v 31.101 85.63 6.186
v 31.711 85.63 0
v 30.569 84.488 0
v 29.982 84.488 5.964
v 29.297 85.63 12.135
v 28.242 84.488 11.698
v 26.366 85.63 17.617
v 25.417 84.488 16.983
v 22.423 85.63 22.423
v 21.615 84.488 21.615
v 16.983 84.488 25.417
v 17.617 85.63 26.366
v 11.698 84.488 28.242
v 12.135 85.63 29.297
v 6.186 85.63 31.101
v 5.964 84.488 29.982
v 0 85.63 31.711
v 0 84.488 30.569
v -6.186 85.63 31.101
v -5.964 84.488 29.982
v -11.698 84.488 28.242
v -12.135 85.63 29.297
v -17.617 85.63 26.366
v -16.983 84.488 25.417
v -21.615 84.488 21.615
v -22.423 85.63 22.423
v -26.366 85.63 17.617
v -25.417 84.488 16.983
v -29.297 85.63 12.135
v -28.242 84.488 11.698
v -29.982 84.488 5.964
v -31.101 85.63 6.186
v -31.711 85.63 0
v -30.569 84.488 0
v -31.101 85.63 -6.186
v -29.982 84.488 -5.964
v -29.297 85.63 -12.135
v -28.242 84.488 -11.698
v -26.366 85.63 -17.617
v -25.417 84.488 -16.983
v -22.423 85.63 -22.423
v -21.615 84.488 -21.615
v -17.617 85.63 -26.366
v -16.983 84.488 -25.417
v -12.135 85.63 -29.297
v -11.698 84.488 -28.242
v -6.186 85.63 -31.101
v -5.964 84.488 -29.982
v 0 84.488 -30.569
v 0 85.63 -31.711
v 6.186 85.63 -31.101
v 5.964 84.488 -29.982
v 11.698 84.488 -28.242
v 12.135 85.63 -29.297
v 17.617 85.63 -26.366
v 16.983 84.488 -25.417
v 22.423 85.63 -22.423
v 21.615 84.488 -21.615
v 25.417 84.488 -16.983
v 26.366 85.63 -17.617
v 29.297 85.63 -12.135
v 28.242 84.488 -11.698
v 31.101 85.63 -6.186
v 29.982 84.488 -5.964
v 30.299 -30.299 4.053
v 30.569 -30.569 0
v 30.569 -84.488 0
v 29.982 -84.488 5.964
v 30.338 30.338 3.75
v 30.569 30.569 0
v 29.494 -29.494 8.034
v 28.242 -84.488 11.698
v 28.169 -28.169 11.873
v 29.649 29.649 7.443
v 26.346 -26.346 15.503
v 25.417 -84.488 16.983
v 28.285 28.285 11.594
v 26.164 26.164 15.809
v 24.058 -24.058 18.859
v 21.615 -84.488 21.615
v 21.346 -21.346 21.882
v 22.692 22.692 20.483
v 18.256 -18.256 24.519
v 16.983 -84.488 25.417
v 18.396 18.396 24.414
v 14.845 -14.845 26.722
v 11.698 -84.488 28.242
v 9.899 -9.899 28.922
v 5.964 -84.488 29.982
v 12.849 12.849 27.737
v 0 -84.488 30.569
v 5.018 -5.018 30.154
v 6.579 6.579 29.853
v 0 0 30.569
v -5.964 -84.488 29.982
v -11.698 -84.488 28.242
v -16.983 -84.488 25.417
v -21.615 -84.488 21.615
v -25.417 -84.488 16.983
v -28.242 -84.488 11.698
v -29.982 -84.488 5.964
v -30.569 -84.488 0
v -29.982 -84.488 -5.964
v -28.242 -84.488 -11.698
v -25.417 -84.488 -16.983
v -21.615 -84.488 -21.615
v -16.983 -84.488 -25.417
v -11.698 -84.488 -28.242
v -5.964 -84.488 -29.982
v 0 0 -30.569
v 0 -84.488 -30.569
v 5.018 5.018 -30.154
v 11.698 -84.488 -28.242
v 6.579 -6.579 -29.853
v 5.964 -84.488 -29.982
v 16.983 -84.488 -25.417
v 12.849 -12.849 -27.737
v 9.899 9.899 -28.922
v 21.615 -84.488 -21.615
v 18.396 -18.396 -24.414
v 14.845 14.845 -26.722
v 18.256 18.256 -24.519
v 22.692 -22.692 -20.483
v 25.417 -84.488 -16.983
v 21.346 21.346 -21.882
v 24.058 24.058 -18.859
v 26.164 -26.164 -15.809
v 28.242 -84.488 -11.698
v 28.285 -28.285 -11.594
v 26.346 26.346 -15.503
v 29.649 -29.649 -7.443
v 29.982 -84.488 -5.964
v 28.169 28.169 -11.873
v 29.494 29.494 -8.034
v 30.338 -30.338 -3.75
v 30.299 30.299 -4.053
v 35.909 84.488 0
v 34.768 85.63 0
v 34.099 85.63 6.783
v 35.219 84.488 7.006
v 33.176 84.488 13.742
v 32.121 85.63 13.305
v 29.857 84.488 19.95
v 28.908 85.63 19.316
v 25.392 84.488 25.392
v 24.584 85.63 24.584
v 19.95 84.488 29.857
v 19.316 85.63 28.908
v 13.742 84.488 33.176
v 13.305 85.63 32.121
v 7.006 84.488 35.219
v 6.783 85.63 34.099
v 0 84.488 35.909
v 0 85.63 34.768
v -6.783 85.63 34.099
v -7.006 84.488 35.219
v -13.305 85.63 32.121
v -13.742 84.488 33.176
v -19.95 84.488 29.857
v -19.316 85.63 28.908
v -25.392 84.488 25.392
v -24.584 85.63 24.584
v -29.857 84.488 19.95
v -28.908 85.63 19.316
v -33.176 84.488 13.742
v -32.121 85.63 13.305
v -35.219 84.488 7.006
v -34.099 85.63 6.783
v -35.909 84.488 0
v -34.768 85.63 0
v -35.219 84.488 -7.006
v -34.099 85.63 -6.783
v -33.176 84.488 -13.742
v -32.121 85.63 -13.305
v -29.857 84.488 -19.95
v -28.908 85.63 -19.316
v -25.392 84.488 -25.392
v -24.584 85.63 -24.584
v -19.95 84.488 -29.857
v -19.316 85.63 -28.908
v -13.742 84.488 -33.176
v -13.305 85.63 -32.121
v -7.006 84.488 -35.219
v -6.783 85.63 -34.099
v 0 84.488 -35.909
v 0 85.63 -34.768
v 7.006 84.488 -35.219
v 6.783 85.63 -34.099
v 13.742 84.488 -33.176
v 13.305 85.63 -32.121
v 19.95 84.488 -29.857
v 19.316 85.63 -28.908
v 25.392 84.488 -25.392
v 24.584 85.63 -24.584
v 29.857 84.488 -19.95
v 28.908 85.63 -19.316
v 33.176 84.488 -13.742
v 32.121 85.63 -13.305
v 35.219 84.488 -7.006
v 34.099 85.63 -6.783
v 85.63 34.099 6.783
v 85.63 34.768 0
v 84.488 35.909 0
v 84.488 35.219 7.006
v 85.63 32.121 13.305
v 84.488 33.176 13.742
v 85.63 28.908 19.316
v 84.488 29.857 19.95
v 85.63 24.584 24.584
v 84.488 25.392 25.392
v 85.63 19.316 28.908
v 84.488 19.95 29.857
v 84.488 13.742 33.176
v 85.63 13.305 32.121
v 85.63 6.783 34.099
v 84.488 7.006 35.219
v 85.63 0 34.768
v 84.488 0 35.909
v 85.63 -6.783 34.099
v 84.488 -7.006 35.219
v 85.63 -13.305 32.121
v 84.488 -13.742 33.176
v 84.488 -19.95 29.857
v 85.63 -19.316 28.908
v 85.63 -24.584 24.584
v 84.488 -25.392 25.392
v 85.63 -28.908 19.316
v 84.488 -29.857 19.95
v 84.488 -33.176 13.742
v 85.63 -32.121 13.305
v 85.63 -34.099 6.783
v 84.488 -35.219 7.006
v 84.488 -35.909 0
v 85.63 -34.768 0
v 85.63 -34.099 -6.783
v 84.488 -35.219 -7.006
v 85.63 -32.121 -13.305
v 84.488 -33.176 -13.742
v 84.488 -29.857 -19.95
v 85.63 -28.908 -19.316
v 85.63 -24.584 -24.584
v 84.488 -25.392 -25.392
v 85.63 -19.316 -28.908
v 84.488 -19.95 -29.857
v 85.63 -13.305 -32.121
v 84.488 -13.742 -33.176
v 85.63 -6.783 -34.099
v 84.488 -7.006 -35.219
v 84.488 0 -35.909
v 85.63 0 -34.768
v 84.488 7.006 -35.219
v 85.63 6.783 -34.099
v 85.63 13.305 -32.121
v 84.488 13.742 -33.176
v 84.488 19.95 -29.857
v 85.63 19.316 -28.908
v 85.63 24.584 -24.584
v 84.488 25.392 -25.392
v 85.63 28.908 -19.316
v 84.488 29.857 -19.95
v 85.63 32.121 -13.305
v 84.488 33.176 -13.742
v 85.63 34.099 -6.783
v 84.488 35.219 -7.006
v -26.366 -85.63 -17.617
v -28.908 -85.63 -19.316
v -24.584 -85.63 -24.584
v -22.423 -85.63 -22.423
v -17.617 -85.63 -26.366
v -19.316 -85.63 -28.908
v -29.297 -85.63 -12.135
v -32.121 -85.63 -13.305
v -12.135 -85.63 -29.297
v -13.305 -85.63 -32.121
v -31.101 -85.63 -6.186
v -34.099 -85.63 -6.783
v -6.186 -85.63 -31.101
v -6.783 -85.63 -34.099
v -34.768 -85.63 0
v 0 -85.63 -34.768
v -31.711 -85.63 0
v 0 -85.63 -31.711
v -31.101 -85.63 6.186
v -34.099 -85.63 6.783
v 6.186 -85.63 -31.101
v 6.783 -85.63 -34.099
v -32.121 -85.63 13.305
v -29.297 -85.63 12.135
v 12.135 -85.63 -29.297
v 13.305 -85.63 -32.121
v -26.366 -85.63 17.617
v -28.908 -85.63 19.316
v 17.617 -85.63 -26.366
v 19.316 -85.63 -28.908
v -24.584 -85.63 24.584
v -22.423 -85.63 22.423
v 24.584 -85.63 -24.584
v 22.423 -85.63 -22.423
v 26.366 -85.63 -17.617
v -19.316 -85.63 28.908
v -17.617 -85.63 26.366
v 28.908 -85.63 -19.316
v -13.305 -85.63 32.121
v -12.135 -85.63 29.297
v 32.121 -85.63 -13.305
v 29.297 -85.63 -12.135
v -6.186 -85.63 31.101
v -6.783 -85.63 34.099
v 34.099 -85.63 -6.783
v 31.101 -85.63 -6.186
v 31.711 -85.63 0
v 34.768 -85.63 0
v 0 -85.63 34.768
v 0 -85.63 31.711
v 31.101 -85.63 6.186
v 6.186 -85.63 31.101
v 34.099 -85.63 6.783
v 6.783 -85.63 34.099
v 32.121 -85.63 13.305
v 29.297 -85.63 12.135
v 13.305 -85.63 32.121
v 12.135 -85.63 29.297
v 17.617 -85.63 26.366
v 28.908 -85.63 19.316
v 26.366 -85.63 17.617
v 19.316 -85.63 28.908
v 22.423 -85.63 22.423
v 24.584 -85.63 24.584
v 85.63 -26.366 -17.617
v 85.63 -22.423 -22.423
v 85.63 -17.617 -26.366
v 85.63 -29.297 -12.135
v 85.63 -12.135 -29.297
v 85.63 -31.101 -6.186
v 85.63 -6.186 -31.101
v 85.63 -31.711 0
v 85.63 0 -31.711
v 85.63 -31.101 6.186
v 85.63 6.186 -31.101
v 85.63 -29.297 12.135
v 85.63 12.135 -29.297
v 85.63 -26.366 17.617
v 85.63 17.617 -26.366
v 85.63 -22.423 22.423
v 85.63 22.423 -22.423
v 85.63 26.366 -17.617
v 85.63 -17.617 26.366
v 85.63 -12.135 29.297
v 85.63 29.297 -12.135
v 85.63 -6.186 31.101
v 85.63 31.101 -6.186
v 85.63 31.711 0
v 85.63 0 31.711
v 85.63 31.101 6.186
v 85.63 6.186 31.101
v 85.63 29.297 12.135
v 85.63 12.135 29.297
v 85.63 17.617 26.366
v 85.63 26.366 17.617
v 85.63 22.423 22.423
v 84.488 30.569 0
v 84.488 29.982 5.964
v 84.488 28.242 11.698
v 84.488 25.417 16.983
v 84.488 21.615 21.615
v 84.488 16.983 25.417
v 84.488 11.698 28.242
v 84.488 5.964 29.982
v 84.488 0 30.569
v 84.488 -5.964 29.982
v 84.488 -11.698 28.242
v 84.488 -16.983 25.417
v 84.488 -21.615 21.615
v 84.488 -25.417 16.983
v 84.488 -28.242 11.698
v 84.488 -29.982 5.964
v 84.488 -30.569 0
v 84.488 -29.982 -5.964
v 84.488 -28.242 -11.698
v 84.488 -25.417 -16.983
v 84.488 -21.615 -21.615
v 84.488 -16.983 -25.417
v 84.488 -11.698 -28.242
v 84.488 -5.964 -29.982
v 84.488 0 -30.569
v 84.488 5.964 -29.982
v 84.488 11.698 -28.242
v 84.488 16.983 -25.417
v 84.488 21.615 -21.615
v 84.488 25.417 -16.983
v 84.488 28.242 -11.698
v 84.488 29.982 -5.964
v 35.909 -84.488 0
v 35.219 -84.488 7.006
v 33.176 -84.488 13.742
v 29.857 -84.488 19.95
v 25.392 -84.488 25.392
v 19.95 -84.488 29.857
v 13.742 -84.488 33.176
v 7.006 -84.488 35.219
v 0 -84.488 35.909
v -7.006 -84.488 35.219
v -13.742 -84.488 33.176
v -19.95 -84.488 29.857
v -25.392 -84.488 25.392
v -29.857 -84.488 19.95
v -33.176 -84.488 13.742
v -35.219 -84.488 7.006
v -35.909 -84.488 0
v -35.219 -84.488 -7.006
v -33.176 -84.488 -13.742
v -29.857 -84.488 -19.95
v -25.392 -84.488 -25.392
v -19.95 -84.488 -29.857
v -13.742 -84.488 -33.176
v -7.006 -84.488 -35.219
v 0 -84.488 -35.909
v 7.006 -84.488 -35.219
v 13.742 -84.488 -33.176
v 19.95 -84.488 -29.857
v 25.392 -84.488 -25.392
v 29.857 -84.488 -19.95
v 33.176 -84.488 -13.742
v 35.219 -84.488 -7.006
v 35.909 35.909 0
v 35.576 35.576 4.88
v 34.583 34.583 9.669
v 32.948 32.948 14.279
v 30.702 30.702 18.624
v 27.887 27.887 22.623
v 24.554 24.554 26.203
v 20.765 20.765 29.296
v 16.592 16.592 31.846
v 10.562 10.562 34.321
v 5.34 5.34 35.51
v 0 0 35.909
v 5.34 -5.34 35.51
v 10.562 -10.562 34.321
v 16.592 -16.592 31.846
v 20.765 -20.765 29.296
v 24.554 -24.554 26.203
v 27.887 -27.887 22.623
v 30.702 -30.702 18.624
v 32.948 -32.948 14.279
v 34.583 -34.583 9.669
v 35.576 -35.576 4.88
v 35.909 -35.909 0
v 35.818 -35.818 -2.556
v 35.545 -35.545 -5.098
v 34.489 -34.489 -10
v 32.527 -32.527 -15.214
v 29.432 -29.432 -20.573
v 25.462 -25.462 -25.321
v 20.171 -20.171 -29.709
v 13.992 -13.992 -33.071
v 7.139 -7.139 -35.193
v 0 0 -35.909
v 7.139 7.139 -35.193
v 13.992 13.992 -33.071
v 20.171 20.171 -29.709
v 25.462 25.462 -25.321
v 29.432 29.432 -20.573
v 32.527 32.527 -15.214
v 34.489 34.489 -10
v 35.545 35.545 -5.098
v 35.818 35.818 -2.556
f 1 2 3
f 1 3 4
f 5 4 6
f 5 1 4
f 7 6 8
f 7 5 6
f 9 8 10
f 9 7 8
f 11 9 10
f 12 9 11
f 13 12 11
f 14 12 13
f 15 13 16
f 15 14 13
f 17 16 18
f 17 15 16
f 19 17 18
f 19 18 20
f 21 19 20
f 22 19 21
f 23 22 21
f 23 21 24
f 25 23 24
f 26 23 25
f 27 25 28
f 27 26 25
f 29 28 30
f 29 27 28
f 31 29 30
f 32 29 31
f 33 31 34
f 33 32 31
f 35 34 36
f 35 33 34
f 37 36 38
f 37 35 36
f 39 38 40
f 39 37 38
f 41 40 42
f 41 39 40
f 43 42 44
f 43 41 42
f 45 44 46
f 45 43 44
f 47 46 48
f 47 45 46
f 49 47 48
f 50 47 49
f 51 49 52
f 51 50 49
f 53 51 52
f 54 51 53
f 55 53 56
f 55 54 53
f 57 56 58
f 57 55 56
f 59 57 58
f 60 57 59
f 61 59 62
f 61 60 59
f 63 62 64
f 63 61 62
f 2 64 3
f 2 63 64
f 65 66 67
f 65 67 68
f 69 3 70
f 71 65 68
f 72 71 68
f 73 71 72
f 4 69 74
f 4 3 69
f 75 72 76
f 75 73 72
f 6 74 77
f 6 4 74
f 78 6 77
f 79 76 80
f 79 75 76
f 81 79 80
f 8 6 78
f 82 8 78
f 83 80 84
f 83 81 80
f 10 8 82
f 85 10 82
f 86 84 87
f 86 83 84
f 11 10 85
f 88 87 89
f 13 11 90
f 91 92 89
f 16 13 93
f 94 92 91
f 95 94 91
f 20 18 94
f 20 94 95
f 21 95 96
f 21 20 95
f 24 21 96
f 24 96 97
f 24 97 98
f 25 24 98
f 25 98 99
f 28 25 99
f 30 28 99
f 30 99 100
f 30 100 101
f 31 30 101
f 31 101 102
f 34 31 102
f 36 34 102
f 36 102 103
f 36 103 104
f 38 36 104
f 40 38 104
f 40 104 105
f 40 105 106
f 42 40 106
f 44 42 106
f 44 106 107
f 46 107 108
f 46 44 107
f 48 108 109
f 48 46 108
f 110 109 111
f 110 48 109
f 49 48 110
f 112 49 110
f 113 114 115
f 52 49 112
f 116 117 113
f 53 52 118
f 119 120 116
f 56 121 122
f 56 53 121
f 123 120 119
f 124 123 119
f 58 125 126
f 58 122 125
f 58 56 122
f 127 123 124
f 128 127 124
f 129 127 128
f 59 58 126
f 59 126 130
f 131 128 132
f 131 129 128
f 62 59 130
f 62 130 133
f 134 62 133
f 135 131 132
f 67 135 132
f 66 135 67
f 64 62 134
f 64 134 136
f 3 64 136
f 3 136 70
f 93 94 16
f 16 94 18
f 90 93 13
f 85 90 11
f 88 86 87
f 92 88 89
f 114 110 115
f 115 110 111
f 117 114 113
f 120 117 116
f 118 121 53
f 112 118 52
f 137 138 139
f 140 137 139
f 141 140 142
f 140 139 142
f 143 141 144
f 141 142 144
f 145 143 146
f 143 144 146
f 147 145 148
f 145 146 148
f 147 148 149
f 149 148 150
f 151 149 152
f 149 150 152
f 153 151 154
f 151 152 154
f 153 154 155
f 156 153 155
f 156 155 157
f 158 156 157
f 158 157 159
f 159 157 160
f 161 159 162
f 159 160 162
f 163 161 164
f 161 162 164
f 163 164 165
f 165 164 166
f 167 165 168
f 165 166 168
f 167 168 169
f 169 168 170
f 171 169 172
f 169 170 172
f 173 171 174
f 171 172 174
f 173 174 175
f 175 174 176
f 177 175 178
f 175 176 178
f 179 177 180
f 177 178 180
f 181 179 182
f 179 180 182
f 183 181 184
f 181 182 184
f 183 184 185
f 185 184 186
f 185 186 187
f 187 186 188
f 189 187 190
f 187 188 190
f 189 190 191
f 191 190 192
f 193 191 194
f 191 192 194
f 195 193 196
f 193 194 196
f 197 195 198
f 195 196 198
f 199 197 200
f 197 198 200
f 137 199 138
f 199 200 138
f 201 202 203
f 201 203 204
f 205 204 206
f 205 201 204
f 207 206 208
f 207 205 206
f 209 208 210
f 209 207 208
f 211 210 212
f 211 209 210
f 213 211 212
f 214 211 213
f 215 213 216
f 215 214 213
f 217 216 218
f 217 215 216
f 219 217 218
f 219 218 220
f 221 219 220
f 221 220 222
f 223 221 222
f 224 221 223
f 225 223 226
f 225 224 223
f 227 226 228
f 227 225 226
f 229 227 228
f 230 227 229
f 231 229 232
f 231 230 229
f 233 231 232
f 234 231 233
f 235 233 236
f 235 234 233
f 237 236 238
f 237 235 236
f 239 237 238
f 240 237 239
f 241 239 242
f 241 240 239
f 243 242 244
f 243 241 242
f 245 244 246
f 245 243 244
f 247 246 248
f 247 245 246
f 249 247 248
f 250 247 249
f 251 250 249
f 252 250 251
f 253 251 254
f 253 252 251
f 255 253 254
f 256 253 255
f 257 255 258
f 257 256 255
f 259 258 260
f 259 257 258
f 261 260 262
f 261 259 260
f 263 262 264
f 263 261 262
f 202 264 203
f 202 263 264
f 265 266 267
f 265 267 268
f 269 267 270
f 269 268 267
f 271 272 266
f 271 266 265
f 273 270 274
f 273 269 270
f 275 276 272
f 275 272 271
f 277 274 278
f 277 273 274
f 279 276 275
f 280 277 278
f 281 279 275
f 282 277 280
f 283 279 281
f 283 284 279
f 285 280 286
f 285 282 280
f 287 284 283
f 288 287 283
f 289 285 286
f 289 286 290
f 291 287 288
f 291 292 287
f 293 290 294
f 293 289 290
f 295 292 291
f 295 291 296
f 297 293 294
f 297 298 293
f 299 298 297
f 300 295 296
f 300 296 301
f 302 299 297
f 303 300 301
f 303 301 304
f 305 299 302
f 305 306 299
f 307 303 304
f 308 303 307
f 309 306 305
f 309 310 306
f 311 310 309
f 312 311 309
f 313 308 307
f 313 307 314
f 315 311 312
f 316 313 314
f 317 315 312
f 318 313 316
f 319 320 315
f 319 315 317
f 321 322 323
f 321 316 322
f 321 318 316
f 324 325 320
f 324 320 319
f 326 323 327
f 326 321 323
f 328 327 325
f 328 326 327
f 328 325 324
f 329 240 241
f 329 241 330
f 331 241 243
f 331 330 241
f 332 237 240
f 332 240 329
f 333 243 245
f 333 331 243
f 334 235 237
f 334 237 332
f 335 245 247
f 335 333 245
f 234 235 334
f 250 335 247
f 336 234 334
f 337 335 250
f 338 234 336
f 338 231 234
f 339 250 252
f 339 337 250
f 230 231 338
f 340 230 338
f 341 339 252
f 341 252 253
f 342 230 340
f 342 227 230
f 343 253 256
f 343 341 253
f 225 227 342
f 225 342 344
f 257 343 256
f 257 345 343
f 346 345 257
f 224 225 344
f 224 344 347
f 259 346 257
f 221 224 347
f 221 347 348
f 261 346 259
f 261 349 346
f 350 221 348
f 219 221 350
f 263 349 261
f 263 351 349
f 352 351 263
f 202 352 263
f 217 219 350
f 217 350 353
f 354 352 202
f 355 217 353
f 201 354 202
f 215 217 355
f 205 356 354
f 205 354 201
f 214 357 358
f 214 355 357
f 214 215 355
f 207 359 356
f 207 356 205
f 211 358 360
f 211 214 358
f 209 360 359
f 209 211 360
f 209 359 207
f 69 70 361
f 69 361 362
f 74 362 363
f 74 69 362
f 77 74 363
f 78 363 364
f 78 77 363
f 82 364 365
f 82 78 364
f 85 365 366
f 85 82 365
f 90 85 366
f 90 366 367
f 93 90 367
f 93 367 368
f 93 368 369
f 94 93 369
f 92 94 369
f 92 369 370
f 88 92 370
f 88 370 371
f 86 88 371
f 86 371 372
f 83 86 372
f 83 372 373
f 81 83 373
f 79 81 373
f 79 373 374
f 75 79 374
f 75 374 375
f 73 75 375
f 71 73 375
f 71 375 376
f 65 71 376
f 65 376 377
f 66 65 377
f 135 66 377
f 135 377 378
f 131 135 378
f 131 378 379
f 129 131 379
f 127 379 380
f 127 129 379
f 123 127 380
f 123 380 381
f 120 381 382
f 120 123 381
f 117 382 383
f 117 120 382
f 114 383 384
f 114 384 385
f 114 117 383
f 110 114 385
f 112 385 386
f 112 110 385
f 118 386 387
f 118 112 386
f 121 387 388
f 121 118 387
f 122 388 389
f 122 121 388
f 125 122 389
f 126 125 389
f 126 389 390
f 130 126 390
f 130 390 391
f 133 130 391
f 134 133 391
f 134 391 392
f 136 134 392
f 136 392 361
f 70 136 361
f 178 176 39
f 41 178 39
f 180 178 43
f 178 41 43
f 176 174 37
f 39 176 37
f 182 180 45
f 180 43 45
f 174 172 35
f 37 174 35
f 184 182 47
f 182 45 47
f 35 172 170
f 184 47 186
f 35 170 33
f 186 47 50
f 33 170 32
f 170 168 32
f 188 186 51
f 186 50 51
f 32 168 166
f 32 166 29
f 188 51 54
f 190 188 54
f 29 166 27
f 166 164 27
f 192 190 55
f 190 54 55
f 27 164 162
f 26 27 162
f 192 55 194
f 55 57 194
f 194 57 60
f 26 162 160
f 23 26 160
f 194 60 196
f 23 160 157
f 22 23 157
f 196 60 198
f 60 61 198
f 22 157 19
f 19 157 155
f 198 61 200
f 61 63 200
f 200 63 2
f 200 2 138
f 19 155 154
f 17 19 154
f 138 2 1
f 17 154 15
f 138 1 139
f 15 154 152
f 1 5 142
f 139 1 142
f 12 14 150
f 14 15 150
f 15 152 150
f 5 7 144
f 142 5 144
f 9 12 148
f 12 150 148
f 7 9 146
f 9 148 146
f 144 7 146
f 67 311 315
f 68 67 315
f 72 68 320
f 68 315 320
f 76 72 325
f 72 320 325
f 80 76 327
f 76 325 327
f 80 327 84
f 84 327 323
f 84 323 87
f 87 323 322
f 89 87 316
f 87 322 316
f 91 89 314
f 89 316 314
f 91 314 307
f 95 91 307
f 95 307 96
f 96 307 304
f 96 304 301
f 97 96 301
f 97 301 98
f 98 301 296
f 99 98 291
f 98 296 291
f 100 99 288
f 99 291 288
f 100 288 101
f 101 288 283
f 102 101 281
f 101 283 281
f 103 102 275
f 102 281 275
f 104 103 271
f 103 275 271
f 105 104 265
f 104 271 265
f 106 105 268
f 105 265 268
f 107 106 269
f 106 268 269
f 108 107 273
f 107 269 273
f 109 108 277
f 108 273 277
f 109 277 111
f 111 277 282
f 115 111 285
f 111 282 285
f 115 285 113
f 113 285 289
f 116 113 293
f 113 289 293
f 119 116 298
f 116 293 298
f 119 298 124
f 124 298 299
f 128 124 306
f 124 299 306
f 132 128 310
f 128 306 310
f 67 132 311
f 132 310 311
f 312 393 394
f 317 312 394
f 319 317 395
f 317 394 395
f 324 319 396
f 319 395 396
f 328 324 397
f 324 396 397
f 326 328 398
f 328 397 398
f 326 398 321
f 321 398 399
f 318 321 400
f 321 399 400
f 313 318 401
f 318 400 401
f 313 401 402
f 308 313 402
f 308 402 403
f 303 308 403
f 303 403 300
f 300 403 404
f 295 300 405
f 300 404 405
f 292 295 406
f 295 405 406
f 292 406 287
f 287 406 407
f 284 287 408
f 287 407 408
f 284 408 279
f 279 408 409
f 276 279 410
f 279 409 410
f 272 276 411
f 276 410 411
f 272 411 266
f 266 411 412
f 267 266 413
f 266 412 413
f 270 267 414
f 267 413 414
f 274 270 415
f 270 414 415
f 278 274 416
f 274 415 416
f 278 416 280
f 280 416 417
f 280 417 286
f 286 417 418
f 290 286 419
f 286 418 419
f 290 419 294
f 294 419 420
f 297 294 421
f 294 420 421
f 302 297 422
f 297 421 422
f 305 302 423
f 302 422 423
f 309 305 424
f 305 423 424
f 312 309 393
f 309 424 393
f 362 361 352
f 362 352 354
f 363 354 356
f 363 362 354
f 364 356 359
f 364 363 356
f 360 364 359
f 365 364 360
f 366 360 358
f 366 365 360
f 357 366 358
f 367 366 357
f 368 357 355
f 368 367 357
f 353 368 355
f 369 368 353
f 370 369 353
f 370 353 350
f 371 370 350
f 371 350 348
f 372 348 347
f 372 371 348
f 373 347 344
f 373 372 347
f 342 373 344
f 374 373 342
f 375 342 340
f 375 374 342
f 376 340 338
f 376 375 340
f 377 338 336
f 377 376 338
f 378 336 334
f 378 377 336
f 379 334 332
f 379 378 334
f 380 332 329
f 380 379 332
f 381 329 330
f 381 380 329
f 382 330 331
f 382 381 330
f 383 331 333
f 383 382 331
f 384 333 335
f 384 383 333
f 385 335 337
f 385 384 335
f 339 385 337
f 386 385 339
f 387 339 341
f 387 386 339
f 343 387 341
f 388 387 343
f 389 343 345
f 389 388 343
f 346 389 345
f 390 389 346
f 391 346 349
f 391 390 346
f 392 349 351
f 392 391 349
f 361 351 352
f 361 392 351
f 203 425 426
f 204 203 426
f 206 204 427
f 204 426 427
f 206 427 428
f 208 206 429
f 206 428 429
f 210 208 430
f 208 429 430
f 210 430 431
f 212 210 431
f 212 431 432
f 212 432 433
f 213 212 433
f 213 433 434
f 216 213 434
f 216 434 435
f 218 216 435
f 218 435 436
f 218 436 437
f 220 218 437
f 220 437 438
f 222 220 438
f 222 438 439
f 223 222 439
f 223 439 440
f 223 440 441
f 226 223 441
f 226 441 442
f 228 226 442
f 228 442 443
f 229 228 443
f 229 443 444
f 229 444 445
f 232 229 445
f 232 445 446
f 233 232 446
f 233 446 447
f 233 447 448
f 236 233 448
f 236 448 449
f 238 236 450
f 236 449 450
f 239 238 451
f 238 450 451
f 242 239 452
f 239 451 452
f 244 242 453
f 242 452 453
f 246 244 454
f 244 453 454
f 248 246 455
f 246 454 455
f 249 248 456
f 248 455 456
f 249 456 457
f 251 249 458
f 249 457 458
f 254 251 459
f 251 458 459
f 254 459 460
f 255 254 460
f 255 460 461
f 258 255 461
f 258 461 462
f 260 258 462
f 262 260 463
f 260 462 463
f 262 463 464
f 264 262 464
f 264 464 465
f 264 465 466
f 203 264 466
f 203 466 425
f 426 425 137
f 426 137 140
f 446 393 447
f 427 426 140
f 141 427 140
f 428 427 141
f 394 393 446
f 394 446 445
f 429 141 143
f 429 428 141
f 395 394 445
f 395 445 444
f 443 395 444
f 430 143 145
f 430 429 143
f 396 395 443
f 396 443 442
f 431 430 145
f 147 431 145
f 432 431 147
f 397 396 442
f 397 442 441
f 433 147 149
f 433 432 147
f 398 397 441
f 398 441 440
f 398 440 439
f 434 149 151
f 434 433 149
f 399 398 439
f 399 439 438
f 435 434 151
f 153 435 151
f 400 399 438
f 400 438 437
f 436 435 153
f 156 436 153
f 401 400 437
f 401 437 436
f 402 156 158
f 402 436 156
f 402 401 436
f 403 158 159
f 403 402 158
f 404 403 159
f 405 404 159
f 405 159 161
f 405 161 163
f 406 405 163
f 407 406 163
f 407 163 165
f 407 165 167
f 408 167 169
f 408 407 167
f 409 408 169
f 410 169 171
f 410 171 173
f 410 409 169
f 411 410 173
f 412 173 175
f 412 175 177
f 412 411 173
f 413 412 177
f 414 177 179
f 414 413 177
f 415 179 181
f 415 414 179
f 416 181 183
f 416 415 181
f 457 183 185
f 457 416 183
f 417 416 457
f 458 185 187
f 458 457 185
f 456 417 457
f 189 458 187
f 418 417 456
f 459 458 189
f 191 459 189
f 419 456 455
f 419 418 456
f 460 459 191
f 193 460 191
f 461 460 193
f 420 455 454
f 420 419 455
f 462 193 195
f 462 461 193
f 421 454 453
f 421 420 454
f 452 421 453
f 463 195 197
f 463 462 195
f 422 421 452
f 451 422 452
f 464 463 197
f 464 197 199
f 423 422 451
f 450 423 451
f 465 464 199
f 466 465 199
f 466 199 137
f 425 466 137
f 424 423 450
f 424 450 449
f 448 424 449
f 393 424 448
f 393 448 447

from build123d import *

# Parameters (mm, degrees)
F0_R          = 24.765
F0_R_2        = 21.082
F1_DEPTH      = 59.055
F2_R          = 24.765
F2_R_2        = 21.082
F3_DEPTH      = 59.055
F4_DEPTH      = 59.0560001
F5_DEPTH      = 59.0560001
F5_DEPTH_BACK = 59.0560001
F6_SIZE       = 0.7874
F7_SCALE      = 1.45


with BuildPart() as f1:
    # F0 (on Front) → F1 (new body, symmetric)
    with BuildSketch(Plane.XZ):
        Circle(F0_R)
        Circle(F0_R_2, mode=Mode.SUBTRACT)
    extrude(amount=F1_DEPTH, both=True)

    # F2 (on Right) → F3 (join)
    with BuildSketch(Plane.YZ):
        Circle(F2_R)
        Circle(F2_R_2, mode=Mode.SUBTRACT)
    extrude(amount=F3_DEPTH)

    # F2 (on Right) → F4 (cut, through all)
    with BuildSketch(Plane.YZ):
        Circle(F2_R_2)
    extrude(amount=F4_DEPTH, mode=Mode.SUBTRACT)

    # F0 (on Front) → F5 (cut, two sides)
    with BuildSketch(Plane.XZ) as f5_sk:
        Circle(F0_R_2)
    extrude(amount=F5_DEPTH, mode=Mode.SUBTRACT)
    extrude(f5_sk.sketch, amount=-F5_DEPTH_BACK, mode=Mode.SUBTRACT)

    # F6
    f6_edges = [f1.edges().sort_by_distance(p)[0] for p in [
        (-21.082, -59.055, 0),
        (-24.765, -59.055, 0),
        (59.055, -24.765, 0),
        (59.055, -21.082, 0),
        (-21.082, 59.055, 0),
        (-24.765, 59.055, 0),
    ]]
    chamfer(f6_edges, length=F6_SIZE)


with BuildPart() as f1_1:
    # F7: moved
    add(f1.part.scale(F7_SCALE))


solid = f1_1.part
